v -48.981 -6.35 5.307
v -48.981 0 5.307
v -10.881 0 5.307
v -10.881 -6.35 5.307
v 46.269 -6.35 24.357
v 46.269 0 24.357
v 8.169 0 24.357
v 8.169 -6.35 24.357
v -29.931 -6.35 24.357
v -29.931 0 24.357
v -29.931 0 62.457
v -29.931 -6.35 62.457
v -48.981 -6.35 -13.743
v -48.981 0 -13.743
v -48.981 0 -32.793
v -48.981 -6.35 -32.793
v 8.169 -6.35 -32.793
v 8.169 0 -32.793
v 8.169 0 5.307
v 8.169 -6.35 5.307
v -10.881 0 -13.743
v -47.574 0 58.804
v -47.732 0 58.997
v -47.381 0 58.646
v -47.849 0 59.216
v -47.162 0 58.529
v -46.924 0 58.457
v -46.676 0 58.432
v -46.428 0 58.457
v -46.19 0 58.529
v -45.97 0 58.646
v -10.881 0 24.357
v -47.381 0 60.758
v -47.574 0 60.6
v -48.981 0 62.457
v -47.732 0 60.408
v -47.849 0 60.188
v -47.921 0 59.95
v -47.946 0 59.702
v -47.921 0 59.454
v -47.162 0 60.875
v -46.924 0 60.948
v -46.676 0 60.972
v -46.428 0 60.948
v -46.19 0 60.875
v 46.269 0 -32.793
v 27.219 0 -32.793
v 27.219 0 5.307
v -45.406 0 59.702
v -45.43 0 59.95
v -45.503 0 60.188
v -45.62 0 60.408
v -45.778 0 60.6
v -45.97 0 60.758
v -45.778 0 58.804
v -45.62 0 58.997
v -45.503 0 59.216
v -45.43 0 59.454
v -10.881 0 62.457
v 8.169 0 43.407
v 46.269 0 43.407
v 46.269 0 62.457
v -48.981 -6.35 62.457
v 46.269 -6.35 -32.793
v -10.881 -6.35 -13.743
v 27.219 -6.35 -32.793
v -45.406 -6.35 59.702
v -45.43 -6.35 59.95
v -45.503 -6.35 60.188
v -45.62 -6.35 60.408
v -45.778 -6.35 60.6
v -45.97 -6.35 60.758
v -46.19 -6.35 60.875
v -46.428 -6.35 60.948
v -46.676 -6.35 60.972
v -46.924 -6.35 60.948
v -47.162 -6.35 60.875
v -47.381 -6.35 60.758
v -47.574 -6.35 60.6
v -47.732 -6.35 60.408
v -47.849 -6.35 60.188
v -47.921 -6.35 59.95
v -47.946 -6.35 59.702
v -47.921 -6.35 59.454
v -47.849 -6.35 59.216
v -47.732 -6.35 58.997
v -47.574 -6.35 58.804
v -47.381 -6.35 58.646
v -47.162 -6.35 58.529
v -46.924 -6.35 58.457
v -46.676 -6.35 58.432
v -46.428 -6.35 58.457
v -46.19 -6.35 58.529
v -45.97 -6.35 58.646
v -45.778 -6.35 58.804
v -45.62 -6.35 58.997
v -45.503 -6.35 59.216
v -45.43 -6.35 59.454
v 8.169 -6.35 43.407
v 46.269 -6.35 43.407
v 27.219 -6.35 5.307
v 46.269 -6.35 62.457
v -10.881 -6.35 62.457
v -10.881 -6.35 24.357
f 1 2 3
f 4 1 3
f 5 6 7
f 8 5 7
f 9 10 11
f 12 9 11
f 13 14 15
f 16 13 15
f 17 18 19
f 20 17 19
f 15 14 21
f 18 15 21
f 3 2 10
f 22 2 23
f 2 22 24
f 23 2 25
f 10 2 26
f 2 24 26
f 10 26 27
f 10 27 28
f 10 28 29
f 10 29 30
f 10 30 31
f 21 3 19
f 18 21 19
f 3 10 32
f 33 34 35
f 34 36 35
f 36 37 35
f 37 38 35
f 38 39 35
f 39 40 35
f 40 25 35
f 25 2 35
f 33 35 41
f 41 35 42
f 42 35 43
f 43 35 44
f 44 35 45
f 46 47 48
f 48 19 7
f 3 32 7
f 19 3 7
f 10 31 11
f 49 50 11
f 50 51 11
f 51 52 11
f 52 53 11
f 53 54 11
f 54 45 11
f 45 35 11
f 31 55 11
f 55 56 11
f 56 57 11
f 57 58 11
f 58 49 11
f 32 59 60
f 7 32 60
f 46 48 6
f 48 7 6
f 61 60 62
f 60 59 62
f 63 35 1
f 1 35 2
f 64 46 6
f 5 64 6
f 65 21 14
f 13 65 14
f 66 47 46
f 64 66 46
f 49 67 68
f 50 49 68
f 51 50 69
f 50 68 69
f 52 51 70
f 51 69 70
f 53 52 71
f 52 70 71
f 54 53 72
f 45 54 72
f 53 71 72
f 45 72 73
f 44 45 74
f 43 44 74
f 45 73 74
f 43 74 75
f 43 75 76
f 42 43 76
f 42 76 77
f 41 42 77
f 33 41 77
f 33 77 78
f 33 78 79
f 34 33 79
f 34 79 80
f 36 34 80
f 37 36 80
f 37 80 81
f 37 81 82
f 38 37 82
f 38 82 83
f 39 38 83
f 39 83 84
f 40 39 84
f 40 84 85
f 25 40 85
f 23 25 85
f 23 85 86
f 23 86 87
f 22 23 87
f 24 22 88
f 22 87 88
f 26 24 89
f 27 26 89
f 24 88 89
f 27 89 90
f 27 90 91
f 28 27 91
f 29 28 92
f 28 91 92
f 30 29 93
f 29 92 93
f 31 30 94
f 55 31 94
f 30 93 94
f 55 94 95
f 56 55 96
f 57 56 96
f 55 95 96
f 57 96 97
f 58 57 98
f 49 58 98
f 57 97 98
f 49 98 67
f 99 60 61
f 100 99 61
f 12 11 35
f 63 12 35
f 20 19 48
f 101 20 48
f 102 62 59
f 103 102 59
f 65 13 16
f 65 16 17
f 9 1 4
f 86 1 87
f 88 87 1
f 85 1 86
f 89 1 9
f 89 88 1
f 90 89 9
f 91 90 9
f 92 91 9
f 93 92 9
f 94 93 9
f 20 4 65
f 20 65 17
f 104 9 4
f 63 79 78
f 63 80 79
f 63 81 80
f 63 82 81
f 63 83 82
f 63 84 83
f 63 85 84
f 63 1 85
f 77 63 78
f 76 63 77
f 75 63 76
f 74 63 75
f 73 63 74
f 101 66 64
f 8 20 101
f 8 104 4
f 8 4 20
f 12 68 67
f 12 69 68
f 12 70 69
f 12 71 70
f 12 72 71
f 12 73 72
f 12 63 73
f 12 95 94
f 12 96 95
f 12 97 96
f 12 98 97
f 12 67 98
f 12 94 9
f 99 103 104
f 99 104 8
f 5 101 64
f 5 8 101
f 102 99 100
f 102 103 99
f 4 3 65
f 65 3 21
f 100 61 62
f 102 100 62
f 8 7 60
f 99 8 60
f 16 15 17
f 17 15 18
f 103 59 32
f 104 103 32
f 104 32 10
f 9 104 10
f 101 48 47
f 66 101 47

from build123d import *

# Parameters (mm, degrees)
F0_W     = 19.05
F0_H     = 19.05
F1_DEPTH = 6.35
F2_R     = 1.27
F3_DEPTH = 25.4


with BuildPart() as f1:
    # F0 (on Front) → F1 (new body)
    with BuildSketch(Plane.XZ):
        Polygon((-10.8805632712, 62.4568768001), (-10.8805632712, 24.3568768001), (8.1694367288, 24.3568768001), (8.1694367288, 43.4068768001), (46.2694367288, 43.4068768001), (46.2694367288, 62.4568768001), align=None)
        with Locations((-1.3555632712, 14.8318768001)):
            Rectangle(F0_W, F0_H)
        Polygon((8.1694367288, 24.3568768001), (8.1694367288, 5.3068768001), (27.2194367288, 5.3068768001), (27.2194367288, -32.7931231999), (46.2694367288, -32.7931231999), (46.2694367288, 24.3568768001), align=None)
        Polygon((8.1694367288, 5.3068768001), (-10.8805632712, 5.3068768001), (-10.8805632712, -13.7431231999), (-48.9805632712, -13.7431231999), (-48.9805632712, -32.7931231999), (8.1694367288, -32.7931231999), align=None)
        Polygon((-29.9305632712, 62.4568768001), (-48.9805632712, 62.4568768001), (-48.9805632712, 5.3068768001), (-10.8805632712, 5.3068768001), (-10.8805632712, 24.3568768001), (-29.9305632712, 24.3568768001), align=None)
    extrude(amount=F1_DEPTH)

    # F2 (on face) → F3 (cut)
    with BuildSketch(Plane.XZ.offset(6.35)):
        with Locations((-46.6758534312, 59.7021207213)):
            Circle(F2_R)
    extrude(amount=-F3_DEPTH, mode=Mode.SUBTRACT)


solid = f1.part
